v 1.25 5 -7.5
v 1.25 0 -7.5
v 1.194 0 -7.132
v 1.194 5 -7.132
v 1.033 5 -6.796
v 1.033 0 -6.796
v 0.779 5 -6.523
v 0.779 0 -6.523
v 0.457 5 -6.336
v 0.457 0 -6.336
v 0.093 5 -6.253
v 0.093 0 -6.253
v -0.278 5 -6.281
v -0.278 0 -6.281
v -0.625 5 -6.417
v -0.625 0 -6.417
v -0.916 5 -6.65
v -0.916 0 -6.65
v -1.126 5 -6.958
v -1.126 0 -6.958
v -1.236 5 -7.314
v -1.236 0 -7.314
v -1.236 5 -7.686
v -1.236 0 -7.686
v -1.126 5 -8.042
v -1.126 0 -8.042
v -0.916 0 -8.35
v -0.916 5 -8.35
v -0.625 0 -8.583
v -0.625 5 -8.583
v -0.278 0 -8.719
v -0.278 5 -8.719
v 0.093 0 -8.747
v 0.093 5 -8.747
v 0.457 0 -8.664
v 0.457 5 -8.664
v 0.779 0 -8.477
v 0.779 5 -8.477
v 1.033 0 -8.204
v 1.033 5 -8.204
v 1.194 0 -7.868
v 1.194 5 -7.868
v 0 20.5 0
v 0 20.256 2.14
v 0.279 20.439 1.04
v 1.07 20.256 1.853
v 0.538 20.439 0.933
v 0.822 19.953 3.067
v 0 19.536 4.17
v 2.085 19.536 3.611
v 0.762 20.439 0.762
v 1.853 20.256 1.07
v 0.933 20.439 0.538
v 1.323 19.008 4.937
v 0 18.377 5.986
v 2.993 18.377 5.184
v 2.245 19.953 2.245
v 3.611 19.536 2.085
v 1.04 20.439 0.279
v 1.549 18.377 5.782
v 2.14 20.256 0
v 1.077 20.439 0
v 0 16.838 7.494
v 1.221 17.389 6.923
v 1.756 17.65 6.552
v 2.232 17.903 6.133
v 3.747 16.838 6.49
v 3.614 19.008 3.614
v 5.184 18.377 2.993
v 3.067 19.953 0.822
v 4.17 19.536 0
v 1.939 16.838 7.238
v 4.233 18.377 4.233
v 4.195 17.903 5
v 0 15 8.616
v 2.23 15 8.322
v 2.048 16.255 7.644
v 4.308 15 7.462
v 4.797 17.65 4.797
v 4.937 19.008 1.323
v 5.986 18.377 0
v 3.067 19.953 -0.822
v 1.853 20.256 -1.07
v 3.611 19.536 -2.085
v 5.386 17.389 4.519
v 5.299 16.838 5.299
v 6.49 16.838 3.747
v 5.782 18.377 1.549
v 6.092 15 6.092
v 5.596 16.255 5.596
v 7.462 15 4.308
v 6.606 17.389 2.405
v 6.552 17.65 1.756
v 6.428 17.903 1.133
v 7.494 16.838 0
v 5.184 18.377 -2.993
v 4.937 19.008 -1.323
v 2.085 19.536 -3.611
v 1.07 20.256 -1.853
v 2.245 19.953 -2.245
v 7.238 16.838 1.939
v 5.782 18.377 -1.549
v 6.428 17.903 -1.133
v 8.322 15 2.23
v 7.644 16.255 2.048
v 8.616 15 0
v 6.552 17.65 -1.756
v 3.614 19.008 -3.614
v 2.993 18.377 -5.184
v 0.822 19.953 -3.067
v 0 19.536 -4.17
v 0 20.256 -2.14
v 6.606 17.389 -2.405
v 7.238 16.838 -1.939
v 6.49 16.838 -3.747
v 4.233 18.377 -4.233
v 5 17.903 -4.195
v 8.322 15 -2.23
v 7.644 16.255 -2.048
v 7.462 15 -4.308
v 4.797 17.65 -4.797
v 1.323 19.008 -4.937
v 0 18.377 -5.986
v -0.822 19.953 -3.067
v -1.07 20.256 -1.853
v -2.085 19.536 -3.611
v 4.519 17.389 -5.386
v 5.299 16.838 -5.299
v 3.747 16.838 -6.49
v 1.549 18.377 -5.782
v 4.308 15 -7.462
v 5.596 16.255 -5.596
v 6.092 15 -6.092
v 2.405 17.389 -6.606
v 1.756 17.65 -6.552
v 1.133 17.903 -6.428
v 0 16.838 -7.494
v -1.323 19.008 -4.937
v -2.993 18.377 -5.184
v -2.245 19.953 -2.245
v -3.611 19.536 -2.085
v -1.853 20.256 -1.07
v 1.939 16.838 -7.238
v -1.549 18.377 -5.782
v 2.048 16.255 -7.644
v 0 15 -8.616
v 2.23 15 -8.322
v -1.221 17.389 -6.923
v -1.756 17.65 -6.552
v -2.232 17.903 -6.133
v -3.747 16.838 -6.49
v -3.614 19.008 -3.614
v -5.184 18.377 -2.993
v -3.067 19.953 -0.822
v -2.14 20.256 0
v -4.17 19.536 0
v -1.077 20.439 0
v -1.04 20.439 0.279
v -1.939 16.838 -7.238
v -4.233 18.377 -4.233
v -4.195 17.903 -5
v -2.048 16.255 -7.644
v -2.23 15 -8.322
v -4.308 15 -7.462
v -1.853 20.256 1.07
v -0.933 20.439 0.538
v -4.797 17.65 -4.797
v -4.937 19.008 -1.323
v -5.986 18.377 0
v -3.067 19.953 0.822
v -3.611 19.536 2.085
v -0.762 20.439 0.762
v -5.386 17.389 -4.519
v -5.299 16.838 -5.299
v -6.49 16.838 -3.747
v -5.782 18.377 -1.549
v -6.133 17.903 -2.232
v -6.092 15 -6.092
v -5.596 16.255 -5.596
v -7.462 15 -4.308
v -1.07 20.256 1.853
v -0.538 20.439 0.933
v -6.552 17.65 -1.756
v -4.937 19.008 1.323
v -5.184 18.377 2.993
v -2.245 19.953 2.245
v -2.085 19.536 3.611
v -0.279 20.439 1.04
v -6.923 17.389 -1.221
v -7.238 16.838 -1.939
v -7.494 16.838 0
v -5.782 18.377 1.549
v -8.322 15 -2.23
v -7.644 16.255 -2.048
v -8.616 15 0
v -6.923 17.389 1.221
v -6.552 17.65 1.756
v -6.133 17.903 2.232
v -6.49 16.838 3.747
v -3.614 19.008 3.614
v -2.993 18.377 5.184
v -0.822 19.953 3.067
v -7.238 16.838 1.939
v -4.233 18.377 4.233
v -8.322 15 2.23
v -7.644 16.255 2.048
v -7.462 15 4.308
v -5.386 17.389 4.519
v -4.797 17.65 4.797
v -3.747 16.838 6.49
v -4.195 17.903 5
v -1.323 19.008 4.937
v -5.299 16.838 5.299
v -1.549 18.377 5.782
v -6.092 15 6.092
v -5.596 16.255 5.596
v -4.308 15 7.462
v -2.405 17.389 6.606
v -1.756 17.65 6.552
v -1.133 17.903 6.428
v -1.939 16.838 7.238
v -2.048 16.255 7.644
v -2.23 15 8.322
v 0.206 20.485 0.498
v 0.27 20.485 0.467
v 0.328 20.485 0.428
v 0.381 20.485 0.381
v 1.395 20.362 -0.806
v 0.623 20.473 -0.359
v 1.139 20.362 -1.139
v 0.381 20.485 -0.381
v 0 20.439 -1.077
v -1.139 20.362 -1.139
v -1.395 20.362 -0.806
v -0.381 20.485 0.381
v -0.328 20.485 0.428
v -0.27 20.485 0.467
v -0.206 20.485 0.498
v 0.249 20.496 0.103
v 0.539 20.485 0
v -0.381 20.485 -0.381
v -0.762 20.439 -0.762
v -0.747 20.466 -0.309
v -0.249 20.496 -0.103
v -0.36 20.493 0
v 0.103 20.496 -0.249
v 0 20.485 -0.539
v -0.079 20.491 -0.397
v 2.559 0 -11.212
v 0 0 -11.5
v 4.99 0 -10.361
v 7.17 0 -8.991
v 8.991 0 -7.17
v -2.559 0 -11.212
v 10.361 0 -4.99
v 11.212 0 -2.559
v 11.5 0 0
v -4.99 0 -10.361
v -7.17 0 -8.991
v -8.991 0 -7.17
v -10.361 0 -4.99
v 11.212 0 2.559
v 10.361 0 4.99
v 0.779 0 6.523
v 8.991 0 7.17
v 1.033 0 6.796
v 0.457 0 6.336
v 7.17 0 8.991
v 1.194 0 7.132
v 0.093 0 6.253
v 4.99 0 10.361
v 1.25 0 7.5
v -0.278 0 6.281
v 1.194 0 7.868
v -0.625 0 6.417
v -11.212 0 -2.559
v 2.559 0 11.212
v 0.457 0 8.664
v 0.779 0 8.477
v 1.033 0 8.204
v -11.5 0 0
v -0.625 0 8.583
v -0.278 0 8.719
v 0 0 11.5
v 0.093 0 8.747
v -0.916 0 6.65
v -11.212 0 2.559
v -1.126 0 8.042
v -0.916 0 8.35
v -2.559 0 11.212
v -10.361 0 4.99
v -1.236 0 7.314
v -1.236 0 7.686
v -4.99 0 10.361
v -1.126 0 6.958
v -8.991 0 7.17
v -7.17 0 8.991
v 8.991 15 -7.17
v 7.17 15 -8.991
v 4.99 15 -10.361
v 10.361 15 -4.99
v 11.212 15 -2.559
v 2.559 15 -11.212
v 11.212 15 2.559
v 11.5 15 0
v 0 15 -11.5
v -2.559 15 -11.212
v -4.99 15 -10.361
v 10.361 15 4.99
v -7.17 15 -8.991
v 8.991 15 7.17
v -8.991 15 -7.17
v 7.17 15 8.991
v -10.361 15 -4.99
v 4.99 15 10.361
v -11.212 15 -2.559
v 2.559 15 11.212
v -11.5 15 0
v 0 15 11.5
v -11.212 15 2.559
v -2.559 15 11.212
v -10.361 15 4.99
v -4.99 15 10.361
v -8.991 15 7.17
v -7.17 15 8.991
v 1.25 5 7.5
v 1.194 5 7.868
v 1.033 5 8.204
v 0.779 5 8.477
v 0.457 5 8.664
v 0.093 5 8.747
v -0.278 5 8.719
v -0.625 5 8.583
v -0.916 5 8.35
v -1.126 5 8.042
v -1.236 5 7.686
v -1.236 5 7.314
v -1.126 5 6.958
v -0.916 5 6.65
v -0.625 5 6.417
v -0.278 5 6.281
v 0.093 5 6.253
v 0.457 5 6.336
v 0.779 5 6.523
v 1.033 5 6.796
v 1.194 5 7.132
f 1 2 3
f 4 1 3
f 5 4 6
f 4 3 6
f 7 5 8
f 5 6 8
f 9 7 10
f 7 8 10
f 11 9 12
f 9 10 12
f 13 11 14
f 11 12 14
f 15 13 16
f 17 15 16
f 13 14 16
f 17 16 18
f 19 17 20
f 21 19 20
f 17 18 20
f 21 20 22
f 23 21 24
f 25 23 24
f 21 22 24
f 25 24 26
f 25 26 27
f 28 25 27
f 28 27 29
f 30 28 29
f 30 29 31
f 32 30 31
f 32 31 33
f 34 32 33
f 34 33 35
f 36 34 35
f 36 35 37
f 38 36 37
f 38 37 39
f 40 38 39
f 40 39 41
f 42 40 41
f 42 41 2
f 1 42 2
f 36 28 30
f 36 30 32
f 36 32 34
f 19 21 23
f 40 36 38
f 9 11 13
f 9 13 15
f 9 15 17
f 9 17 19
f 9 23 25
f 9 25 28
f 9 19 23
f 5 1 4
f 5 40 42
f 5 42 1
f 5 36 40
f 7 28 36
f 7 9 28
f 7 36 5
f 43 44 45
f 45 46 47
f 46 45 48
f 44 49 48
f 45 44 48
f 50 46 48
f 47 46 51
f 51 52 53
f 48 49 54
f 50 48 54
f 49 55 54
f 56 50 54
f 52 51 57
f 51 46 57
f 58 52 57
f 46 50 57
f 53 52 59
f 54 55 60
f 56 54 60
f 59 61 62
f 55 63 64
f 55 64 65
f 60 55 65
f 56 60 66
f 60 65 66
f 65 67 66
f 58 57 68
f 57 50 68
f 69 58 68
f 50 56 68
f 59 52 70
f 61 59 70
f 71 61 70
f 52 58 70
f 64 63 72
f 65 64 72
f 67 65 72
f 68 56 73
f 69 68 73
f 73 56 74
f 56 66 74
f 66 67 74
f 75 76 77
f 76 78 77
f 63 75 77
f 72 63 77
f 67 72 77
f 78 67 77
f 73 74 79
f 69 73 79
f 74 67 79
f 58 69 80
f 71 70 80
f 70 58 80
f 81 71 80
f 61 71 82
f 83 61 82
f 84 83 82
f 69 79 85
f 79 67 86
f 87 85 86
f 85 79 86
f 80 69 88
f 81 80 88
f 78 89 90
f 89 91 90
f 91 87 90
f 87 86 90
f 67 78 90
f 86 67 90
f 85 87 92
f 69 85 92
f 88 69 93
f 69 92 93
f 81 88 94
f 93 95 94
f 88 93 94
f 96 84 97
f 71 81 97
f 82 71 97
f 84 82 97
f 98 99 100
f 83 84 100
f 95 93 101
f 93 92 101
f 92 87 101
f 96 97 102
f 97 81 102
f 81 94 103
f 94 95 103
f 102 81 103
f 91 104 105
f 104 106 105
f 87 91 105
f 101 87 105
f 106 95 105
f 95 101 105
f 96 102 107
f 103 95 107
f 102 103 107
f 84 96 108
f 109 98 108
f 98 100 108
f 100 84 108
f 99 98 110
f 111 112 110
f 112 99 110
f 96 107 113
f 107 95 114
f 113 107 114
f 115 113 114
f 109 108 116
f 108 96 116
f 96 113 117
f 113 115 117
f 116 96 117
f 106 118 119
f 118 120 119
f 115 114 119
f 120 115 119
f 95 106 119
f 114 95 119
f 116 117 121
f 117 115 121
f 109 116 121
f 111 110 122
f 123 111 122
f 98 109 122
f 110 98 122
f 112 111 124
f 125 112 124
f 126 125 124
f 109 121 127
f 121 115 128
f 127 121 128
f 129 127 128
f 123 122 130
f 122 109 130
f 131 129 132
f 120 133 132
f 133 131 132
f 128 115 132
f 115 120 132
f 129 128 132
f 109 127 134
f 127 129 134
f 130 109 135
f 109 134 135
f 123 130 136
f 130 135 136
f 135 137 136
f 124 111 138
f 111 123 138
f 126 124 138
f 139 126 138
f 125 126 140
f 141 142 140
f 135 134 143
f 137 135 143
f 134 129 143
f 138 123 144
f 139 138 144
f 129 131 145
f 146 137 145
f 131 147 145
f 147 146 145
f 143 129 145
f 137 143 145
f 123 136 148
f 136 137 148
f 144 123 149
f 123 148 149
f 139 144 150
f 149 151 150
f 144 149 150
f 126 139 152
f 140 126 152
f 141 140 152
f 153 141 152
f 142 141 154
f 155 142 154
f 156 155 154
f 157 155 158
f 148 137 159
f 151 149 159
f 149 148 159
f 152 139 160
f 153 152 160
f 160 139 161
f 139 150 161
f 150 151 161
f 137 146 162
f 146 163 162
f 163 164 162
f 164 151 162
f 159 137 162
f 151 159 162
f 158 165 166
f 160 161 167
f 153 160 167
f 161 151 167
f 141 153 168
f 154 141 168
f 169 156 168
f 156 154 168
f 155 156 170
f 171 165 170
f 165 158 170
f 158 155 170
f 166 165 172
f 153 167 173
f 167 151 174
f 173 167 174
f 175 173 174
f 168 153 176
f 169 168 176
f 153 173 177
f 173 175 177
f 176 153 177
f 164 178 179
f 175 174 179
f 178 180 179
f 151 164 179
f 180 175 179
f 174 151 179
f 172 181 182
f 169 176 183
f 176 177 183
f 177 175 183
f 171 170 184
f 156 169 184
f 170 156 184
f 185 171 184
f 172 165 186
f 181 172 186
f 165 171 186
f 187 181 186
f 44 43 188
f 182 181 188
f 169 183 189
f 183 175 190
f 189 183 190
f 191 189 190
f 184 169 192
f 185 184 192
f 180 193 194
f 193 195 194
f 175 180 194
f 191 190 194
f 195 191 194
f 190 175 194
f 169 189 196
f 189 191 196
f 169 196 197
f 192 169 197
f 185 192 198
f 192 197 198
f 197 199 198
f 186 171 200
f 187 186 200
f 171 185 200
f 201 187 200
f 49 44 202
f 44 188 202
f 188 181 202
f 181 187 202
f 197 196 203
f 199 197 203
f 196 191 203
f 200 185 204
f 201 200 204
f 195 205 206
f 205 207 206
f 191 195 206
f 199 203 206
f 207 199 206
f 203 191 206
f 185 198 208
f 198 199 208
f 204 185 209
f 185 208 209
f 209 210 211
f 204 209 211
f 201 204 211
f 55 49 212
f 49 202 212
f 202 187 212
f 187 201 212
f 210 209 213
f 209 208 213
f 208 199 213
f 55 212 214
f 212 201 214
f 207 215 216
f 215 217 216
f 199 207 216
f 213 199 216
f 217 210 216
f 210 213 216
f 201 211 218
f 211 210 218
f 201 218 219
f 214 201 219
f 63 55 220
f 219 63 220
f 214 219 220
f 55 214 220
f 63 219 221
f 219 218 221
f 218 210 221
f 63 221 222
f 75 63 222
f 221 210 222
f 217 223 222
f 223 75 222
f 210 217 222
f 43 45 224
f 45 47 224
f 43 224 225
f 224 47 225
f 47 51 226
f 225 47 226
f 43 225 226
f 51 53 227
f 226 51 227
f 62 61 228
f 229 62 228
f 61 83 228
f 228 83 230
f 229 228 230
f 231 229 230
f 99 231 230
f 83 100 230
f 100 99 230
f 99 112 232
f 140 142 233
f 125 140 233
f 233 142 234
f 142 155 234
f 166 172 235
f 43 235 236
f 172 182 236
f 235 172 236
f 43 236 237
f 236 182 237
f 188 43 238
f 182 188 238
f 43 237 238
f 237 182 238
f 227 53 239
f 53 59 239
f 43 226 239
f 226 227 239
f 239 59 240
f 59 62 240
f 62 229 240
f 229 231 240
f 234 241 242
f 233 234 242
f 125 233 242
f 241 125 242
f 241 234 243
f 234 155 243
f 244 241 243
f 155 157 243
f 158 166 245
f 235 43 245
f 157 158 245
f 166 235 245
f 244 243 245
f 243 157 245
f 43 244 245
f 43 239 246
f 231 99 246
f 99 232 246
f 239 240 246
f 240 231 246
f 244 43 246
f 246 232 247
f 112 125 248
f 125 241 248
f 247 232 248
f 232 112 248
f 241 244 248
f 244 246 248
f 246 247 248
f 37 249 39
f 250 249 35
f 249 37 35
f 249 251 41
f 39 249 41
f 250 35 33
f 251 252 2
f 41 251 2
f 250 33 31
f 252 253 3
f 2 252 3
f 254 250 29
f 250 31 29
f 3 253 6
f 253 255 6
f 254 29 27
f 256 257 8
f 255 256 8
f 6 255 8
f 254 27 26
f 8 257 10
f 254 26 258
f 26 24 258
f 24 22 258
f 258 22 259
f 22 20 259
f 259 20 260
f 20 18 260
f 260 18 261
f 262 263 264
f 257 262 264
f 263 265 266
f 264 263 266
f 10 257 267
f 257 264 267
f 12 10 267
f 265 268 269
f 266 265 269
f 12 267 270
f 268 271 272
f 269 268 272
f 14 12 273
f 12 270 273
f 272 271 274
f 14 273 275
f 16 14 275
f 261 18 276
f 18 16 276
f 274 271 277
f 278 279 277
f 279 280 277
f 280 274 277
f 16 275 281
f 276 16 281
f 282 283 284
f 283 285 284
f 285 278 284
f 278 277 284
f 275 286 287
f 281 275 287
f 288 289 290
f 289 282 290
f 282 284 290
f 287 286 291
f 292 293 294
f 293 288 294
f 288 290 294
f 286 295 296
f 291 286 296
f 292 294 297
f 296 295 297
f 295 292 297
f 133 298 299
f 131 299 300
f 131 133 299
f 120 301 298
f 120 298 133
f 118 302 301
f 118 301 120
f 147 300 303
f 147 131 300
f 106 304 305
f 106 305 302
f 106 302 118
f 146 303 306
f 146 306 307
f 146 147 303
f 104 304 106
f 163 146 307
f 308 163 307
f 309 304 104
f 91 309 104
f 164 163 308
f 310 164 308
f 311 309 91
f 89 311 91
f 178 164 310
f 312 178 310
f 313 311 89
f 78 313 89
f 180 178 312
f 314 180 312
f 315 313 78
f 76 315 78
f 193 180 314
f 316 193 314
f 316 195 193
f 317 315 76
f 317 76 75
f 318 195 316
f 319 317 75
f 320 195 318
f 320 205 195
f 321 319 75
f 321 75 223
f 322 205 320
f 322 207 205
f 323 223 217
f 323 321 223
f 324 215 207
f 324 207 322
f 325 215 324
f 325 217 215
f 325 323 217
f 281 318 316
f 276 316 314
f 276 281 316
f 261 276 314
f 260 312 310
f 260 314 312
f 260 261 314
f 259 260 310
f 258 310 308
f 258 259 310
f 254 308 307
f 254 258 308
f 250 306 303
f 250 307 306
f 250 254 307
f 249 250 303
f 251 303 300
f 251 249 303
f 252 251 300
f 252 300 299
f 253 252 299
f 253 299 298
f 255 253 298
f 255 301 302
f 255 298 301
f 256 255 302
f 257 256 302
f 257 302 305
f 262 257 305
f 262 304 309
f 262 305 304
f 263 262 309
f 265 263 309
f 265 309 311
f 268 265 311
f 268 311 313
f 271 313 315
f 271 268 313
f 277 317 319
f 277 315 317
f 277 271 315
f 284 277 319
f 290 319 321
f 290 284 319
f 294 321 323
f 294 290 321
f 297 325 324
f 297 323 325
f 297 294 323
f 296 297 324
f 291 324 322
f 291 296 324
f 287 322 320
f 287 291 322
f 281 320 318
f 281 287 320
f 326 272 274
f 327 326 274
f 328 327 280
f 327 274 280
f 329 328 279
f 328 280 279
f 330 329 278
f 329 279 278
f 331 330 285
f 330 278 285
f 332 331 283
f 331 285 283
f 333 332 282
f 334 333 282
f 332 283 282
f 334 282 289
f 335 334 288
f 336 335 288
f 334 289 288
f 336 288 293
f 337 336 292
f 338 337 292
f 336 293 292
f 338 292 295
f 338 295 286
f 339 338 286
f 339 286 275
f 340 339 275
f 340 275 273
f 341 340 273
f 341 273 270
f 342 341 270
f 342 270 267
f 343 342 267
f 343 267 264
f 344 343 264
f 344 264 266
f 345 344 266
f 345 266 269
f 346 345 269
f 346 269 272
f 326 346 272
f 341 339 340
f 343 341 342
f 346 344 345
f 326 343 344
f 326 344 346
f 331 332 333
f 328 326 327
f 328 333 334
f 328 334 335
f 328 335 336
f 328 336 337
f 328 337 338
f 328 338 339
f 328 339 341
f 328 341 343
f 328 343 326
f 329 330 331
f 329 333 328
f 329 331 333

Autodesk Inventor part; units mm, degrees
ref_plane "YZ Plane" through (0, 0, 0) normal (1, 0, 0) x (0, 1, 0)
ref_plane "XZ Plane" through (0, 0, 0) normal (0, 1, 0) x (-1, 0, 0)
ref_plane "XY Plane" through (0, 0, 0) normal (0, 0, 1) x (1, 0, 0)
sketch "Sketch1" plane through (0, 0, 0) normal (0, 1, 0) x (-1, 0, 0)
  circle A0 centre (0, 0) radius 11.5
  dimension "d0" = 23
extrude "Extrusion1" add sketch "Sketch1" along normal blind 15
sketch "Sketch2" plane through (0, 0, 0) normal (1, 0, 0) x (0, 1, 0)
  line L0 (0, 0) -> (20.5, 0)
  line L1 (20.5, 0) -> (11.0014, 0) construction
  line L2 (20.5, 0) -> (29.9986, 0) construction
  arc A0 (20.5, 0) -> (15, 8.616) centre (11.0014, 0) ccw
  line L3 (15, 8.616) -> (15, 0)
  line L4 (15, -11.5) -> (15, 11.5) projected
  line L5 (15, 8.616) -> (15, 0)
  line L6 (20.5, 0) -> (15, 0)
  arc A1 (20.5, 0) -> (15, 8.616) centre (11.0014, 0) ccw
  dimension "d3" = 20.5
  dimension "d4" = 9.4986
  dimension "d5" = 180
revolve "Revolution1" add sketch "Sketch2" angle 360 about axis through (0, 20.5, 0) along (0, 1, 0)
sketch "Sketch3" plane through (0, 0, 0) normal (0, -1, 0) x (1, 0, 0)
  line L0 (0, 0) -> (0, -7.5) construction
  line L1 (0, -7.5) -> (0, 7.5)
  circle A0 centre (0, 7.5) radius 1.25
  circle A1 centre (0, -7.5) radius 1.25
  dimension "d7" = 7.5
  dimension "d8" = 15
  dimension "d9" = 2.5
  dimension "d10" = 2.5
extrude "Extrusion2" cut sketch "Sketch3" against normal blind 5
properties part number "Caster"
